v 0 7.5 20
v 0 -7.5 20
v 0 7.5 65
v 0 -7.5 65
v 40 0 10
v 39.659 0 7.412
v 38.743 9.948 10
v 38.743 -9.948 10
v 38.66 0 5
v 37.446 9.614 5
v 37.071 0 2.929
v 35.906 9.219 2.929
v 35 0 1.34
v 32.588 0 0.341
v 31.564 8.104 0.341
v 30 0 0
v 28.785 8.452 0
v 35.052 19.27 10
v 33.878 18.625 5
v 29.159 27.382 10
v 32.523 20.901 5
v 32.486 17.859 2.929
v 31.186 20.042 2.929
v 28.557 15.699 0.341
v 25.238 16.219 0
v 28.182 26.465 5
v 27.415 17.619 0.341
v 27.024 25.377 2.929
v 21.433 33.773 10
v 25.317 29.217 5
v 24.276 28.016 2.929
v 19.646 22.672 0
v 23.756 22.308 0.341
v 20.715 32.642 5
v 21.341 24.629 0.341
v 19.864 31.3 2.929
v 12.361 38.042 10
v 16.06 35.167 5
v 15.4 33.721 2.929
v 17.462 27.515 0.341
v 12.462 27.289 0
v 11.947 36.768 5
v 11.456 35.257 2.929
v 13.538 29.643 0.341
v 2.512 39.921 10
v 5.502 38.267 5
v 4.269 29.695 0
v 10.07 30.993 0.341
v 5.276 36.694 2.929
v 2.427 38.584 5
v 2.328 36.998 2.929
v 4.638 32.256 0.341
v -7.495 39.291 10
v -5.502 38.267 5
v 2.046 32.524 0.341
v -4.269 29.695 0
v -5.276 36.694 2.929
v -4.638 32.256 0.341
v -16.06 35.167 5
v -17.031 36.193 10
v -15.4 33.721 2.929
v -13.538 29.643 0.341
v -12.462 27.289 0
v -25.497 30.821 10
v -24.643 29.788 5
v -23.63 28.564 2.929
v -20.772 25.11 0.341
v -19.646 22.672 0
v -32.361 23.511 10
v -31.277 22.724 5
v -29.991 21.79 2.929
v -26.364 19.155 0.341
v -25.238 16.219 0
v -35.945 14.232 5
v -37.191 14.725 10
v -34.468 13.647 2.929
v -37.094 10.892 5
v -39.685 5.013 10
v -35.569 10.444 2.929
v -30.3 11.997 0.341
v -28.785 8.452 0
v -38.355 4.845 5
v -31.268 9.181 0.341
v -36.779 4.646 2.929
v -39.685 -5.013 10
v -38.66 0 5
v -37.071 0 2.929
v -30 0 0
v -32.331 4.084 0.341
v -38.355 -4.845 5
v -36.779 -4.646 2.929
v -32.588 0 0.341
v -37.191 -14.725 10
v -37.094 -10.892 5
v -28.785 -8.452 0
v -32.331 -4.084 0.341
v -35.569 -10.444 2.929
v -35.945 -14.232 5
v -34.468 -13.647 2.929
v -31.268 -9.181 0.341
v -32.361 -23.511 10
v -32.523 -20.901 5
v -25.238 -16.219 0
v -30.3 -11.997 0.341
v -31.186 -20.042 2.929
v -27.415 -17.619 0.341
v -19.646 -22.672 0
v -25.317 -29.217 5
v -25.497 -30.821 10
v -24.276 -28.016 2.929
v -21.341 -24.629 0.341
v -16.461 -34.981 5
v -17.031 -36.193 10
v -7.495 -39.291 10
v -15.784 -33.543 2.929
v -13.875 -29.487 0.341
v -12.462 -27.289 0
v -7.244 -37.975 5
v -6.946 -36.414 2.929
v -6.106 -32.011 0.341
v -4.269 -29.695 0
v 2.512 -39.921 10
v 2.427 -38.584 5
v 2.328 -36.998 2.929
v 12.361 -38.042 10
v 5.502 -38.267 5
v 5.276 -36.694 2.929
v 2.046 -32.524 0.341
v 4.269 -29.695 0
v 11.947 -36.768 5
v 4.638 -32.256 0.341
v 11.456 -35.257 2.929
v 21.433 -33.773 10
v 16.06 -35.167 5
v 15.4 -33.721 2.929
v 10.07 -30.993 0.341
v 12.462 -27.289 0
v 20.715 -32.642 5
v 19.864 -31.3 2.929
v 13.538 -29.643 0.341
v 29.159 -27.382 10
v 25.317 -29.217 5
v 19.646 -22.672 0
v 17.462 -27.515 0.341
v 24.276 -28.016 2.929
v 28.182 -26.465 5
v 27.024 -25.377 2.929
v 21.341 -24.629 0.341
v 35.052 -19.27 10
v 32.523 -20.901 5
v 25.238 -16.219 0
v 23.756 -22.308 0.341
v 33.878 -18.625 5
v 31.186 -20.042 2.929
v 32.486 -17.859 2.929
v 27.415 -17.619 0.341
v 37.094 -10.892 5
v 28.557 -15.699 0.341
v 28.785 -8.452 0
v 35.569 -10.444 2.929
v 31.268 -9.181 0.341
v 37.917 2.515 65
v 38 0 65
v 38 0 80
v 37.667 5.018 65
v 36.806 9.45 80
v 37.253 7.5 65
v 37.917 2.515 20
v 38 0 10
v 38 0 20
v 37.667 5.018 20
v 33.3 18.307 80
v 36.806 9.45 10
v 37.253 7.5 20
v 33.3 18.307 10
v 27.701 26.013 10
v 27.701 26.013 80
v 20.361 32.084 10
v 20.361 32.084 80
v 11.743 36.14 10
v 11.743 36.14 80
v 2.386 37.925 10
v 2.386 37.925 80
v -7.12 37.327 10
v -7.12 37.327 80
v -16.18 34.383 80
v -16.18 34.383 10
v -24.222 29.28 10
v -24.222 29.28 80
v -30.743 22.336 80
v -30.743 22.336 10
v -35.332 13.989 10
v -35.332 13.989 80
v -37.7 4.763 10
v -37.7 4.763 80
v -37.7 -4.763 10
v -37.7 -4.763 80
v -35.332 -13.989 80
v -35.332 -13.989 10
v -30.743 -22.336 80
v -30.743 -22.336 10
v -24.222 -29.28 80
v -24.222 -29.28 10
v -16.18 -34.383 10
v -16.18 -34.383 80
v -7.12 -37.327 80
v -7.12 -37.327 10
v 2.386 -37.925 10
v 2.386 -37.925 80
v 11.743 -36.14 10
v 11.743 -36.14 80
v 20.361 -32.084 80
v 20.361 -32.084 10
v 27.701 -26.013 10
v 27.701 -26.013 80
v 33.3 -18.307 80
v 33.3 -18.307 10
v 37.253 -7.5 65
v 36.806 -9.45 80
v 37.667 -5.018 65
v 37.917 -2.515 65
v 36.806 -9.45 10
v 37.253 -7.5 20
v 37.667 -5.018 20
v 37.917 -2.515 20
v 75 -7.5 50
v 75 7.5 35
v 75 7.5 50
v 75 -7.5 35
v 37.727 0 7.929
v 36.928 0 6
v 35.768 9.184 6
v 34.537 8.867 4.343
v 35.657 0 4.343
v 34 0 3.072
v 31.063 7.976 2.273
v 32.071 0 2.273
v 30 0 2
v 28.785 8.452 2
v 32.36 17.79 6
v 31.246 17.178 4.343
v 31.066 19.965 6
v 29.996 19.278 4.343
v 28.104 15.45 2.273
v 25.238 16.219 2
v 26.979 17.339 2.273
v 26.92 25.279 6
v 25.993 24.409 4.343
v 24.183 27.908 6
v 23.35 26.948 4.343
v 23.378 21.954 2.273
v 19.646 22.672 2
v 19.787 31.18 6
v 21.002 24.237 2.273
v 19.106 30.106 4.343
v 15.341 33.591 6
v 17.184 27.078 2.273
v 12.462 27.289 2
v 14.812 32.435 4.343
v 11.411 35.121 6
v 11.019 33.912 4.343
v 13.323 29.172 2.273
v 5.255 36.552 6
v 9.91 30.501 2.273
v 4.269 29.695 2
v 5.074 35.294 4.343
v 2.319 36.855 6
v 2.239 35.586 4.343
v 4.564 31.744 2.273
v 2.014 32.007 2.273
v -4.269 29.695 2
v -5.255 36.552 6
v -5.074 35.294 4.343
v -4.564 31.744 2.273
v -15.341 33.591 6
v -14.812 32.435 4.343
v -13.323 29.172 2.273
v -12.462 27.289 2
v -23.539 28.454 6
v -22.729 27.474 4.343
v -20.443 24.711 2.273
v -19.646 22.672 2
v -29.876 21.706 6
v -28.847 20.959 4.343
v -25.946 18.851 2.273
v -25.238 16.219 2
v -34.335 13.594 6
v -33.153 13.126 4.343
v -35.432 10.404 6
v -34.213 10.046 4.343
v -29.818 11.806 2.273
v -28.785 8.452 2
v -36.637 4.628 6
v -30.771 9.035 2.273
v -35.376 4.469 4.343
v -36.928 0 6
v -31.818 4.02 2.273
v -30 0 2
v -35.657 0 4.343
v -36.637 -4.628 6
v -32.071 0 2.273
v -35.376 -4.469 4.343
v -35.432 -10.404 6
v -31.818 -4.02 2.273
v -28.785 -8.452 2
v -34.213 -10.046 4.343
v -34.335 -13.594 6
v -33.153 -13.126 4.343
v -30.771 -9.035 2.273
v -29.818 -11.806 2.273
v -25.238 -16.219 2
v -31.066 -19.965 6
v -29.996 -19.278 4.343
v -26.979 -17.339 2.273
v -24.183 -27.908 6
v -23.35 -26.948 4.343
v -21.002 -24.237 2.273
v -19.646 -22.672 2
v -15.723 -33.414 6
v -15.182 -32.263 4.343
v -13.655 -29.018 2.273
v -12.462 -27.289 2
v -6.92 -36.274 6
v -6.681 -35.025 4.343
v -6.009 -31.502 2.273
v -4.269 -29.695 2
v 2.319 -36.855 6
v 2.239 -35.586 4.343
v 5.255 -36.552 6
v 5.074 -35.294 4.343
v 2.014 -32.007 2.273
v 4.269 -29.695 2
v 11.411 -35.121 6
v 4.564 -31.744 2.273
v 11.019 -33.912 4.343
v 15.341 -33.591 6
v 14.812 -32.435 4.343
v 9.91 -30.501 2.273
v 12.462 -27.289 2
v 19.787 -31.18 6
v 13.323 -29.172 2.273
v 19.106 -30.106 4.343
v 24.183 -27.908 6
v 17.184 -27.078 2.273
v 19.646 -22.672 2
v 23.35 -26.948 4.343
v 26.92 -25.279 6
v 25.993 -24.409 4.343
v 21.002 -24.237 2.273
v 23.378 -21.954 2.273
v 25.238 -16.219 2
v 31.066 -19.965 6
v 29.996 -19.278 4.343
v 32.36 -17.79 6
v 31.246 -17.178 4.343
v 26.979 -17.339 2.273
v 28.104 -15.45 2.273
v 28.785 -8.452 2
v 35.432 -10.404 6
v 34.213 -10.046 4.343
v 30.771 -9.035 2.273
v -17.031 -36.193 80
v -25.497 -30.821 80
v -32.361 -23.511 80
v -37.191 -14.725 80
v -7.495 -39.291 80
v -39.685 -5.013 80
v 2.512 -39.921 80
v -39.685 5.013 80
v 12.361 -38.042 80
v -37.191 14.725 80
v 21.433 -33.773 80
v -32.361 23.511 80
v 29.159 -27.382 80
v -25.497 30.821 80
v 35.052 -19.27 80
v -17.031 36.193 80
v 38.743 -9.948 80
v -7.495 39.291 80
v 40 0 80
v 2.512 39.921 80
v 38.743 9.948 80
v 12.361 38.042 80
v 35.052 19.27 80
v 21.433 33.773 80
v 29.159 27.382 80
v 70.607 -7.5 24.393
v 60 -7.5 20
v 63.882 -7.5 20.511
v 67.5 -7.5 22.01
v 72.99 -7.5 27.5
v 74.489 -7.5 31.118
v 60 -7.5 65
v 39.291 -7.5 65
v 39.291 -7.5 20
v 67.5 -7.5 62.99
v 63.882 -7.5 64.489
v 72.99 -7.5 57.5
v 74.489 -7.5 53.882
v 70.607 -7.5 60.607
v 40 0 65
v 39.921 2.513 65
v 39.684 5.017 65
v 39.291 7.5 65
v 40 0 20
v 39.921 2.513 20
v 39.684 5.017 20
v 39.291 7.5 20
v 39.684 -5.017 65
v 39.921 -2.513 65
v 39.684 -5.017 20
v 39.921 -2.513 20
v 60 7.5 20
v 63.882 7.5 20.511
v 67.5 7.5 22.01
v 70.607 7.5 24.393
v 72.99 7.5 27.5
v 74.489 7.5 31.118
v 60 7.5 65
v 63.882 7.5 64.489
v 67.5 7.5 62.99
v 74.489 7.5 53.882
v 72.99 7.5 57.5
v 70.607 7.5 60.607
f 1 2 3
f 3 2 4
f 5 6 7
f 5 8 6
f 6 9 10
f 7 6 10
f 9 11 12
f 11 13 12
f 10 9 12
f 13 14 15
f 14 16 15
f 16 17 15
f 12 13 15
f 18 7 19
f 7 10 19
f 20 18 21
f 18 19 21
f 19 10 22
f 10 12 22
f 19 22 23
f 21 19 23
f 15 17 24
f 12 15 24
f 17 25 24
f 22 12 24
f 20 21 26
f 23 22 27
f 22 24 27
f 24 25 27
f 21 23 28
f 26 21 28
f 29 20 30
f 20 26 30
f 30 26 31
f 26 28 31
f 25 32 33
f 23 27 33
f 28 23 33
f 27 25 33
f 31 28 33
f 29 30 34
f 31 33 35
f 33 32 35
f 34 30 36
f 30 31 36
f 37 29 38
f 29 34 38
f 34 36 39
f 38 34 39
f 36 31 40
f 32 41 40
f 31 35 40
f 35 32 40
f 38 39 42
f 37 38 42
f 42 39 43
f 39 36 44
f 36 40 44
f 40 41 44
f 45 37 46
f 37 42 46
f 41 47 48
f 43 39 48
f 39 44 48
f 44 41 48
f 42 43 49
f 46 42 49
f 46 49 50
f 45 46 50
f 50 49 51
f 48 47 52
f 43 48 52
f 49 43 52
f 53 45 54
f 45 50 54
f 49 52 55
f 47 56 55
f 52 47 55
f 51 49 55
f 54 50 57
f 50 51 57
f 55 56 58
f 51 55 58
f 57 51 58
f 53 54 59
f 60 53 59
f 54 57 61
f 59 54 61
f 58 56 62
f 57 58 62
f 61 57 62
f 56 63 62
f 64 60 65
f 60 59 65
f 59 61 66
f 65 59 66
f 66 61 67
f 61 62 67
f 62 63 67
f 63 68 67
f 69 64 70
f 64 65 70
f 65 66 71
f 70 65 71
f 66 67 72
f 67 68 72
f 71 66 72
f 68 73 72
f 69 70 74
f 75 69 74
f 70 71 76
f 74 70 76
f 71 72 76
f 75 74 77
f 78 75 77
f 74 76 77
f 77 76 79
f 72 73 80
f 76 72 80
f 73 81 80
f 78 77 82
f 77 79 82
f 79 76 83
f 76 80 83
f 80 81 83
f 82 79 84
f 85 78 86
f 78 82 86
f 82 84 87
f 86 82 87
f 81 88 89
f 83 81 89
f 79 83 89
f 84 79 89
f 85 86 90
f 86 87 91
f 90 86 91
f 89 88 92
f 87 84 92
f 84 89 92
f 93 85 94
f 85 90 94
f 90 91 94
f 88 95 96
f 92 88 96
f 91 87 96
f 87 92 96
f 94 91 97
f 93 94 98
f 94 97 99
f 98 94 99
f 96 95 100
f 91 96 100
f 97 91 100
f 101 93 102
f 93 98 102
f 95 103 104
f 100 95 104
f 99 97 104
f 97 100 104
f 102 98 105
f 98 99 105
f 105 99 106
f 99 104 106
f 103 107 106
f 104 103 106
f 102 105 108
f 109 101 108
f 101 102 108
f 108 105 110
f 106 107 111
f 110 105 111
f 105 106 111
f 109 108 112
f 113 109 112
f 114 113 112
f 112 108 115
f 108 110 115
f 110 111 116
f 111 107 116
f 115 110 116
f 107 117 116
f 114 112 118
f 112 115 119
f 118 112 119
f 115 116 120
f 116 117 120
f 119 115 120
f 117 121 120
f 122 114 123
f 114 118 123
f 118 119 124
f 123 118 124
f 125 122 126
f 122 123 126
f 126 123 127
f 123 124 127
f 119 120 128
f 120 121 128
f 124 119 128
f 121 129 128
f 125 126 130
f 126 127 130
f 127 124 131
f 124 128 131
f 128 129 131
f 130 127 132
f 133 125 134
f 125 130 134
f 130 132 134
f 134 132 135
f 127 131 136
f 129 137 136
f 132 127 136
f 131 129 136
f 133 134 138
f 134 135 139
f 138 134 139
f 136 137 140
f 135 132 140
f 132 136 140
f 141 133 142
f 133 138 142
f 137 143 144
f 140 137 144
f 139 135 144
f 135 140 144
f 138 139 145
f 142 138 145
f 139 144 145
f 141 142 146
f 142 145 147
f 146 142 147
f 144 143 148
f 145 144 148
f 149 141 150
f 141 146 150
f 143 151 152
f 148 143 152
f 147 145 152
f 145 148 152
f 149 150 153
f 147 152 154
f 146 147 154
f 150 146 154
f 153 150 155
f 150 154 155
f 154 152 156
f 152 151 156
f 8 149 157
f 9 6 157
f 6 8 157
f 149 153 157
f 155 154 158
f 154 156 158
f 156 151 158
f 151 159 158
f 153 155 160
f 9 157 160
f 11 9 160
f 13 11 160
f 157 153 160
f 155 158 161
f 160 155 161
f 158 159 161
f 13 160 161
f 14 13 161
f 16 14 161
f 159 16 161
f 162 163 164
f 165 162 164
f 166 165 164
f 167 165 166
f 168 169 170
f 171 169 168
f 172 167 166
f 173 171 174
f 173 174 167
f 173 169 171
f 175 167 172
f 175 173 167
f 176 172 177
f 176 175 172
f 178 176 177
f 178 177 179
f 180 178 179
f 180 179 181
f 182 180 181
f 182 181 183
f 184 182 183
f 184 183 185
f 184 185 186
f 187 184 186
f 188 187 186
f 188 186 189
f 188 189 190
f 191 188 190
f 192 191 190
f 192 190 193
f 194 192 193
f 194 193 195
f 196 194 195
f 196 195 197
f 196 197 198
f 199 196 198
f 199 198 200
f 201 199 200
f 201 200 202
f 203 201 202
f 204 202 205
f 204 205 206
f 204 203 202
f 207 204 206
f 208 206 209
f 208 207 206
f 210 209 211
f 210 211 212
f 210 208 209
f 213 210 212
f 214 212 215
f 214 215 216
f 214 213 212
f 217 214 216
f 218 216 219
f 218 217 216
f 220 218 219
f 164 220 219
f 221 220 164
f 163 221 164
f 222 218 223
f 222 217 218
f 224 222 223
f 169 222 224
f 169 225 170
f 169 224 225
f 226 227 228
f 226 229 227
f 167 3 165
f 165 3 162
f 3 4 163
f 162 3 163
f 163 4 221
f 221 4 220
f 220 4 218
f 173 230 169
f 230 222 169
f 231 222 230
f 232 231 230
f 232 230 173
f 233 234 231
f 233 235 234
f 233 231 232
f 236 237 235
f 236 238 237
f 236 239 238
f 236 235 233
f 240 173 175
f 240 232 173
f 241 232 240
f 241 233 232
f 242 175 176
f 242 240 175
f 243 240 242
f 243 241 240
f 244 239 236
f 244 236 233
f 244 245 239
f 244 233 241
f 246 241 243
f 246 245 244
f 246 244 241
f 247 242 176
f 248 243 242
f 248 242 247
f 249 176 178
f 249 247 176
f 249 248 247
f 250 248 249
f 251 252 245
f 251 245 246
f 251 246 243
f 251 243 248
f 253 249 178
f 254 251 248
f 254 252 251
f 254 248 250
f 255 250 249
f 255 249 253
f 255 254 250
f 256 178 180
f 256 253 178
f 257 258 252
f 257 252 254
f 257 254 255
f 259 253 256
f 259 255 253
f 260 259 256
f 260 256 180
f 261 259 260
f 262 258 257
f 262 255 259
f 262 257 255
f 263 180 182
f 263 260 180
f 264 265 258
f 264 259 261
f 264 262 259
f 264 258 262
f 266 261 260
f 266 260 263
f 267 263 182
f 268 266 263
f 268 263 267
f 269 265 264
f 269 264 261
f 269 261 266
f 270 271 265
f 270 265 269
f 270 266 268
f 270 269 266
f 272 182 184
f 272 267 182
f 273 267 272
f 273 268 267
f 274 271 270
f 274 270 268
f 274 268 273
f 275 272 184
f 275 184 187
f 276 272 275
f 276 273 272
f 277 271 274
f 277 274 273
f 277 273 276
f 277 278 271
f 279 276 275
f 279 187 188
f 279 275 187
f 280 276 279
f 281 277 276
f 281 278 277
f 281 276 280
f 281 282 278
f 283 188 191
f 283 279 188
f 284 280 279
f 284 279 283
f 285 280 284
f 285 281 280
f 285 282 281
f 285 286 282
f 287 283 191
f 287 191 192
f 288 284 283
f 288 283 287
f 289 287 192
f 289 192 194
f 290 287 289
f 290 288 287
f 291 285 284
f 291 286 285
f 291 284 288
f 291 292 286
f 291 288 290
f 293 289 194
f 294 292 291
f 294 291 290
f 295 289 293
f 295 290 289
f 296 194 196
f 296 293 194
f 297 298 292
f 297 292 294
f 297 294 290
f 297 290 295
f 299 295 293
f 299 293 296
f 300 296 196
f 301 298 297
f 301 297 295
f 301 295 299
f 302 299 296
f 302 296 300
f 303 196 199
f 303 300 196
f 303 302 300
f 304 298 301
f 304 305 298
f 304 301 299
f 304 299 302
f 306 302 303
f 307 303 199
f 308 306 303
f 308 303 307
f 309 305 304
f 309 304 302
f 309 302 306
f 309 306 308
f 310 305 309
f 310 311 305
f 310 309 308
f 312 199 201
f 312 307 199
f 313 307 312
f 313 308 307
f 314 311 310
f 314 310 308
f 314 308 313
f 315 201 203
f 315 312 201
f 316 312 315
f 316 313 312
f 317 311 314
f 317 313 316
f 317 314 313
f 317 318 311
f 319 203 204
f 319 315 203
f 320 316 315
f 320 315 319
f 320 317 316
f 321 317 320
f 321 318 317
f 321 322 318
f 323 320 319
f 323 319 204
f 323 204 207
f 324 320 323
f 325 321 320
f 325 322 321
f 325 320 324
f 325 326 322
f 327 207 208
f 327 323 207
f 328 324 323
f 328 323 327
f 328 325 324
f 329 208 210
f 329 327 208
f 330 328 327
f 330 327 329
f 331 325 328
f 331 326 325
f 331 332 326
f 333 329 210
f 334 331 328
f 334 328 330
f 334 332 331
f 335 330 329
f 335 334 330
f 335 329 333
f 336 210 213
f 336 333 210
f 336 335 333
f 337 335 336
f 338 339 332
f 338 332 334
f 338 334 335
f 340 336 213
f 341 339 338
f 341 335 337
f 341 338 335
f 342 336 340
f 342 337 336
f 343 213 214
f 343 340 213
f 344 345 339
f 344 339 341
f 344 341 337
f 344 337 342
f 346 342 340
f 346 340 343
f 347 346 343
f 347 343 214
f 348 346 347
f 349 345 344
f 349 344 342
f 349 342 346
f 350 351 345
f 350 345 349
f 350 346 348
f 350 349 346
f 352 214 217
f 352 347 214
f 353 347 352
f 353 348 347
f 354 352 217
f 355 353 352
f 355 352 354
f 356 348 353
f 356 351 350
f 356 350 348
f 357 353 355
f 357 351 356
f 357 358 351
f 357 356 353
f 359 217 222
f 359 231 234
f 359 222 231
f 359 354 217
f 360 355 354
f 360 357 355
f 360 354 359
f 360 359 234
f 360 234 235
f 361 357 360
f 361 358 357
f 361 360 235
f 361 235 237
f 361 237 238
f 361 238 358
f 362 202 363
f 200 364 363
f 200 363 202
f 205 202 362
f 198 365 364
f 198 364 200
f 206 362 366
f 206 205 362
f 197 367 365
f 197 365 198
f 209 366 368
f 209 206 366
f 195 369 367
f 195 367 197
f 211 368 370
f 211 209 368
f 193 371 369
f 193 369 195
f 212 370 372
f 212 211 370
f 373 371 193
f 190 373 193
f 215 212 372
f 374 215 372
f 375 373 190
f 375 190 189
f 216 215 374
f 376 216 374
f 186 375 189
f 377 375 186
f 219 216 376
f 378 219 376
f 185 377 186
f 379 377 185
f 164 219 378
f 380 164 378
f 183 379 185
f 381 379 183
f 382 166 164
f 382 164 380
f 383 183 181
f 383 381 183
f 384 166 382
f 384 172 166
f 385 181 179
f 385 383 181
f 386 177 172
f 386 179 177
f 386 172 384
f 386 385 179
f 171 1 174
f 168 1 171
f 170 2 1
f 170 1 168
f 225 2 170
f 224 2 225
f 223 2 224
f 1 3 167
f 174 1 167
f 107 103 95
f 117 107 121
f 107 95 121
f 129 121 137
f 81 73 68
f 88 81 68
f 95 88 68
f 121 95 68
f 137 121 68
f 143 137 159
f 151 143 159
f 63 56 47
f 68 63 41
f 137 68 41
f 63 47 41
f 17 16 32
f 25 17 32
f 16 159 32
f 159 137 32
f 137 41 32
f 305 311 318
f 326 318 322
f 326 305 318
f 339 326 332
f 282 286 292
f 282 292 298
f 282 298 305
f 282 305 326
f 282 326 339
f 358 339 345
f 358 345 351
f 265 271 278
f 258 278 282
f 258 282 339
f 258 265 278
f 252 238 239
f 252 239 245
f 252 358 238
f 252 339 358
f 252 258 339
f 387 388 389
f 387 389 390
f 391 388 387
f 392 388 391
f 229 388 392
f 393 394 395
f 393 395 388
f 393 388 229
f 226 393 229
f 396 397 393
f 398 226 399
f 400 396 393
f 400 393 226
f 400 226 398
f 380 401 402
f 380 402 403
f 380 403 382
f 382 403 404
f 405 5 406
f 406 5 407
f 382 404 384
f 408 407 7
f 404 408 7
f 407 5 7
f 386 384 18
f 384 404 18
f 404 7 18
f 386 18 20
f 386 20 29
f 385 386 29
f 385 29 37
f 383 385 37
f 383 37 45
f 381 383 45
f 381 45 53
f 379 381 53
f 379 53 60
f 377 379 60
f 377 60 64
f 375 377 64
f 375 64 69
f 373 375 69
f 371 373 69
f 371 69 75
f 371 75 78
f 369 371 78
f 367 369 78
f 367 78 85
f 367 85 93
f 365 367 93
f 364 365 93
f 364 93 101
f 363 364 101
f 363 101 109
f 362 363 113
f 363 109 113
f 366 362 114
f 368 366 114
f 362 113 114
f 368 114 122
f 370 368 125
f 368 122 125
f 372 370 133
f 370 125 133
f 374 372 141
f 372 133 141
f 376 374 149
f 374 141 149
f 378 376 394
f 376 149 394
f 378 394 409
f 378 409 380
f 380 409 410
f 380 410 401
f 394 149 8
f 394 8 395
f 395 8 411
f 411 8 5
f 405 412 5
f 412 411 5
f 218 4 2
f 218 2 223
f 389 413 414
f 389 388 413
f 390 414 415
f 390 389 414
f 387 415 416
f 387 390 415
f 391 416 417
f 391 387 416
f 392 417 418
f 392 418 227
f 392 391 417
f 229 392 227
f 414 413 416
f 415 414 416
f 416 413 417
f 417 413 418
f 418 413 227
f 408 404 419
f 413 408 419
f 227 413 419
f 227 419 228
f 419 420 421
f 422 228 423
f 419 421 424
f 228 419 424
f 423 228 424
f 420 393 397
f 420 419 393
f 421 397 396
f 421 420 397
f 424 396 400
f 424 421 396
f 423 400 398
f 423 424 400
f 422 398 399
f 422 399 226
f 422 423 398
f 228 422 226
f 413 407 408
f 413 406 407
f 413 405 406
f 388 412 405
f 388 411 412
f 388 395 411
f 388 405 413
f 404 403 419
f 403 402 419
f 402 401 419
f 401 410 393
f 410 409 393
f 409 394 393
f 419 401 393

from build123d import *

# Parameters (mm, degrees)
F0_R     = 40
F1_DEPTH = 80
F2_R     = 10
F3_T     = -2
F4_W     = 75
F4_H     = 45
F5_DEPTH = 7.5
F6_R     = 15


with BuildPart() as f1:
    # F0 (on Top) → F1 (new body)
    with BuildSketch(Plane.XY):
        Circle(F0_R)
    extrude(amount=F1_DEPTH)

    # F2
    f2_edges = [f1.edges().sort_by_distance(p)[0] for p in [
        (-40, 0, 0),
    ]]
    fillet(f2_edges, radius=F2_R)

    # F3
    f3_openings = [f1.faces().sort_by_distance(p)[0] for p in [
        (0, 0, 80),
    ]]
    offset(amount=F3_T, openings=f3_openings)

    # F4 (on Front) → F5 (join, symmetric)
    with BuildSketch(Plane.XZ):
        with Locations((37.5, 42.5)):
            Rectangle(F4_W, F4_H)
    extrude(amount=F5_DEPTH, both=True)

    # F6
    f6_edges = [f1.edges().sort_by_distance(p)[0] for p in [
        (75, 0, 65),
        (75, 0, 20),
    ]]
    fillet(f6_edges, radius=F6_R)


solid = f1.part
